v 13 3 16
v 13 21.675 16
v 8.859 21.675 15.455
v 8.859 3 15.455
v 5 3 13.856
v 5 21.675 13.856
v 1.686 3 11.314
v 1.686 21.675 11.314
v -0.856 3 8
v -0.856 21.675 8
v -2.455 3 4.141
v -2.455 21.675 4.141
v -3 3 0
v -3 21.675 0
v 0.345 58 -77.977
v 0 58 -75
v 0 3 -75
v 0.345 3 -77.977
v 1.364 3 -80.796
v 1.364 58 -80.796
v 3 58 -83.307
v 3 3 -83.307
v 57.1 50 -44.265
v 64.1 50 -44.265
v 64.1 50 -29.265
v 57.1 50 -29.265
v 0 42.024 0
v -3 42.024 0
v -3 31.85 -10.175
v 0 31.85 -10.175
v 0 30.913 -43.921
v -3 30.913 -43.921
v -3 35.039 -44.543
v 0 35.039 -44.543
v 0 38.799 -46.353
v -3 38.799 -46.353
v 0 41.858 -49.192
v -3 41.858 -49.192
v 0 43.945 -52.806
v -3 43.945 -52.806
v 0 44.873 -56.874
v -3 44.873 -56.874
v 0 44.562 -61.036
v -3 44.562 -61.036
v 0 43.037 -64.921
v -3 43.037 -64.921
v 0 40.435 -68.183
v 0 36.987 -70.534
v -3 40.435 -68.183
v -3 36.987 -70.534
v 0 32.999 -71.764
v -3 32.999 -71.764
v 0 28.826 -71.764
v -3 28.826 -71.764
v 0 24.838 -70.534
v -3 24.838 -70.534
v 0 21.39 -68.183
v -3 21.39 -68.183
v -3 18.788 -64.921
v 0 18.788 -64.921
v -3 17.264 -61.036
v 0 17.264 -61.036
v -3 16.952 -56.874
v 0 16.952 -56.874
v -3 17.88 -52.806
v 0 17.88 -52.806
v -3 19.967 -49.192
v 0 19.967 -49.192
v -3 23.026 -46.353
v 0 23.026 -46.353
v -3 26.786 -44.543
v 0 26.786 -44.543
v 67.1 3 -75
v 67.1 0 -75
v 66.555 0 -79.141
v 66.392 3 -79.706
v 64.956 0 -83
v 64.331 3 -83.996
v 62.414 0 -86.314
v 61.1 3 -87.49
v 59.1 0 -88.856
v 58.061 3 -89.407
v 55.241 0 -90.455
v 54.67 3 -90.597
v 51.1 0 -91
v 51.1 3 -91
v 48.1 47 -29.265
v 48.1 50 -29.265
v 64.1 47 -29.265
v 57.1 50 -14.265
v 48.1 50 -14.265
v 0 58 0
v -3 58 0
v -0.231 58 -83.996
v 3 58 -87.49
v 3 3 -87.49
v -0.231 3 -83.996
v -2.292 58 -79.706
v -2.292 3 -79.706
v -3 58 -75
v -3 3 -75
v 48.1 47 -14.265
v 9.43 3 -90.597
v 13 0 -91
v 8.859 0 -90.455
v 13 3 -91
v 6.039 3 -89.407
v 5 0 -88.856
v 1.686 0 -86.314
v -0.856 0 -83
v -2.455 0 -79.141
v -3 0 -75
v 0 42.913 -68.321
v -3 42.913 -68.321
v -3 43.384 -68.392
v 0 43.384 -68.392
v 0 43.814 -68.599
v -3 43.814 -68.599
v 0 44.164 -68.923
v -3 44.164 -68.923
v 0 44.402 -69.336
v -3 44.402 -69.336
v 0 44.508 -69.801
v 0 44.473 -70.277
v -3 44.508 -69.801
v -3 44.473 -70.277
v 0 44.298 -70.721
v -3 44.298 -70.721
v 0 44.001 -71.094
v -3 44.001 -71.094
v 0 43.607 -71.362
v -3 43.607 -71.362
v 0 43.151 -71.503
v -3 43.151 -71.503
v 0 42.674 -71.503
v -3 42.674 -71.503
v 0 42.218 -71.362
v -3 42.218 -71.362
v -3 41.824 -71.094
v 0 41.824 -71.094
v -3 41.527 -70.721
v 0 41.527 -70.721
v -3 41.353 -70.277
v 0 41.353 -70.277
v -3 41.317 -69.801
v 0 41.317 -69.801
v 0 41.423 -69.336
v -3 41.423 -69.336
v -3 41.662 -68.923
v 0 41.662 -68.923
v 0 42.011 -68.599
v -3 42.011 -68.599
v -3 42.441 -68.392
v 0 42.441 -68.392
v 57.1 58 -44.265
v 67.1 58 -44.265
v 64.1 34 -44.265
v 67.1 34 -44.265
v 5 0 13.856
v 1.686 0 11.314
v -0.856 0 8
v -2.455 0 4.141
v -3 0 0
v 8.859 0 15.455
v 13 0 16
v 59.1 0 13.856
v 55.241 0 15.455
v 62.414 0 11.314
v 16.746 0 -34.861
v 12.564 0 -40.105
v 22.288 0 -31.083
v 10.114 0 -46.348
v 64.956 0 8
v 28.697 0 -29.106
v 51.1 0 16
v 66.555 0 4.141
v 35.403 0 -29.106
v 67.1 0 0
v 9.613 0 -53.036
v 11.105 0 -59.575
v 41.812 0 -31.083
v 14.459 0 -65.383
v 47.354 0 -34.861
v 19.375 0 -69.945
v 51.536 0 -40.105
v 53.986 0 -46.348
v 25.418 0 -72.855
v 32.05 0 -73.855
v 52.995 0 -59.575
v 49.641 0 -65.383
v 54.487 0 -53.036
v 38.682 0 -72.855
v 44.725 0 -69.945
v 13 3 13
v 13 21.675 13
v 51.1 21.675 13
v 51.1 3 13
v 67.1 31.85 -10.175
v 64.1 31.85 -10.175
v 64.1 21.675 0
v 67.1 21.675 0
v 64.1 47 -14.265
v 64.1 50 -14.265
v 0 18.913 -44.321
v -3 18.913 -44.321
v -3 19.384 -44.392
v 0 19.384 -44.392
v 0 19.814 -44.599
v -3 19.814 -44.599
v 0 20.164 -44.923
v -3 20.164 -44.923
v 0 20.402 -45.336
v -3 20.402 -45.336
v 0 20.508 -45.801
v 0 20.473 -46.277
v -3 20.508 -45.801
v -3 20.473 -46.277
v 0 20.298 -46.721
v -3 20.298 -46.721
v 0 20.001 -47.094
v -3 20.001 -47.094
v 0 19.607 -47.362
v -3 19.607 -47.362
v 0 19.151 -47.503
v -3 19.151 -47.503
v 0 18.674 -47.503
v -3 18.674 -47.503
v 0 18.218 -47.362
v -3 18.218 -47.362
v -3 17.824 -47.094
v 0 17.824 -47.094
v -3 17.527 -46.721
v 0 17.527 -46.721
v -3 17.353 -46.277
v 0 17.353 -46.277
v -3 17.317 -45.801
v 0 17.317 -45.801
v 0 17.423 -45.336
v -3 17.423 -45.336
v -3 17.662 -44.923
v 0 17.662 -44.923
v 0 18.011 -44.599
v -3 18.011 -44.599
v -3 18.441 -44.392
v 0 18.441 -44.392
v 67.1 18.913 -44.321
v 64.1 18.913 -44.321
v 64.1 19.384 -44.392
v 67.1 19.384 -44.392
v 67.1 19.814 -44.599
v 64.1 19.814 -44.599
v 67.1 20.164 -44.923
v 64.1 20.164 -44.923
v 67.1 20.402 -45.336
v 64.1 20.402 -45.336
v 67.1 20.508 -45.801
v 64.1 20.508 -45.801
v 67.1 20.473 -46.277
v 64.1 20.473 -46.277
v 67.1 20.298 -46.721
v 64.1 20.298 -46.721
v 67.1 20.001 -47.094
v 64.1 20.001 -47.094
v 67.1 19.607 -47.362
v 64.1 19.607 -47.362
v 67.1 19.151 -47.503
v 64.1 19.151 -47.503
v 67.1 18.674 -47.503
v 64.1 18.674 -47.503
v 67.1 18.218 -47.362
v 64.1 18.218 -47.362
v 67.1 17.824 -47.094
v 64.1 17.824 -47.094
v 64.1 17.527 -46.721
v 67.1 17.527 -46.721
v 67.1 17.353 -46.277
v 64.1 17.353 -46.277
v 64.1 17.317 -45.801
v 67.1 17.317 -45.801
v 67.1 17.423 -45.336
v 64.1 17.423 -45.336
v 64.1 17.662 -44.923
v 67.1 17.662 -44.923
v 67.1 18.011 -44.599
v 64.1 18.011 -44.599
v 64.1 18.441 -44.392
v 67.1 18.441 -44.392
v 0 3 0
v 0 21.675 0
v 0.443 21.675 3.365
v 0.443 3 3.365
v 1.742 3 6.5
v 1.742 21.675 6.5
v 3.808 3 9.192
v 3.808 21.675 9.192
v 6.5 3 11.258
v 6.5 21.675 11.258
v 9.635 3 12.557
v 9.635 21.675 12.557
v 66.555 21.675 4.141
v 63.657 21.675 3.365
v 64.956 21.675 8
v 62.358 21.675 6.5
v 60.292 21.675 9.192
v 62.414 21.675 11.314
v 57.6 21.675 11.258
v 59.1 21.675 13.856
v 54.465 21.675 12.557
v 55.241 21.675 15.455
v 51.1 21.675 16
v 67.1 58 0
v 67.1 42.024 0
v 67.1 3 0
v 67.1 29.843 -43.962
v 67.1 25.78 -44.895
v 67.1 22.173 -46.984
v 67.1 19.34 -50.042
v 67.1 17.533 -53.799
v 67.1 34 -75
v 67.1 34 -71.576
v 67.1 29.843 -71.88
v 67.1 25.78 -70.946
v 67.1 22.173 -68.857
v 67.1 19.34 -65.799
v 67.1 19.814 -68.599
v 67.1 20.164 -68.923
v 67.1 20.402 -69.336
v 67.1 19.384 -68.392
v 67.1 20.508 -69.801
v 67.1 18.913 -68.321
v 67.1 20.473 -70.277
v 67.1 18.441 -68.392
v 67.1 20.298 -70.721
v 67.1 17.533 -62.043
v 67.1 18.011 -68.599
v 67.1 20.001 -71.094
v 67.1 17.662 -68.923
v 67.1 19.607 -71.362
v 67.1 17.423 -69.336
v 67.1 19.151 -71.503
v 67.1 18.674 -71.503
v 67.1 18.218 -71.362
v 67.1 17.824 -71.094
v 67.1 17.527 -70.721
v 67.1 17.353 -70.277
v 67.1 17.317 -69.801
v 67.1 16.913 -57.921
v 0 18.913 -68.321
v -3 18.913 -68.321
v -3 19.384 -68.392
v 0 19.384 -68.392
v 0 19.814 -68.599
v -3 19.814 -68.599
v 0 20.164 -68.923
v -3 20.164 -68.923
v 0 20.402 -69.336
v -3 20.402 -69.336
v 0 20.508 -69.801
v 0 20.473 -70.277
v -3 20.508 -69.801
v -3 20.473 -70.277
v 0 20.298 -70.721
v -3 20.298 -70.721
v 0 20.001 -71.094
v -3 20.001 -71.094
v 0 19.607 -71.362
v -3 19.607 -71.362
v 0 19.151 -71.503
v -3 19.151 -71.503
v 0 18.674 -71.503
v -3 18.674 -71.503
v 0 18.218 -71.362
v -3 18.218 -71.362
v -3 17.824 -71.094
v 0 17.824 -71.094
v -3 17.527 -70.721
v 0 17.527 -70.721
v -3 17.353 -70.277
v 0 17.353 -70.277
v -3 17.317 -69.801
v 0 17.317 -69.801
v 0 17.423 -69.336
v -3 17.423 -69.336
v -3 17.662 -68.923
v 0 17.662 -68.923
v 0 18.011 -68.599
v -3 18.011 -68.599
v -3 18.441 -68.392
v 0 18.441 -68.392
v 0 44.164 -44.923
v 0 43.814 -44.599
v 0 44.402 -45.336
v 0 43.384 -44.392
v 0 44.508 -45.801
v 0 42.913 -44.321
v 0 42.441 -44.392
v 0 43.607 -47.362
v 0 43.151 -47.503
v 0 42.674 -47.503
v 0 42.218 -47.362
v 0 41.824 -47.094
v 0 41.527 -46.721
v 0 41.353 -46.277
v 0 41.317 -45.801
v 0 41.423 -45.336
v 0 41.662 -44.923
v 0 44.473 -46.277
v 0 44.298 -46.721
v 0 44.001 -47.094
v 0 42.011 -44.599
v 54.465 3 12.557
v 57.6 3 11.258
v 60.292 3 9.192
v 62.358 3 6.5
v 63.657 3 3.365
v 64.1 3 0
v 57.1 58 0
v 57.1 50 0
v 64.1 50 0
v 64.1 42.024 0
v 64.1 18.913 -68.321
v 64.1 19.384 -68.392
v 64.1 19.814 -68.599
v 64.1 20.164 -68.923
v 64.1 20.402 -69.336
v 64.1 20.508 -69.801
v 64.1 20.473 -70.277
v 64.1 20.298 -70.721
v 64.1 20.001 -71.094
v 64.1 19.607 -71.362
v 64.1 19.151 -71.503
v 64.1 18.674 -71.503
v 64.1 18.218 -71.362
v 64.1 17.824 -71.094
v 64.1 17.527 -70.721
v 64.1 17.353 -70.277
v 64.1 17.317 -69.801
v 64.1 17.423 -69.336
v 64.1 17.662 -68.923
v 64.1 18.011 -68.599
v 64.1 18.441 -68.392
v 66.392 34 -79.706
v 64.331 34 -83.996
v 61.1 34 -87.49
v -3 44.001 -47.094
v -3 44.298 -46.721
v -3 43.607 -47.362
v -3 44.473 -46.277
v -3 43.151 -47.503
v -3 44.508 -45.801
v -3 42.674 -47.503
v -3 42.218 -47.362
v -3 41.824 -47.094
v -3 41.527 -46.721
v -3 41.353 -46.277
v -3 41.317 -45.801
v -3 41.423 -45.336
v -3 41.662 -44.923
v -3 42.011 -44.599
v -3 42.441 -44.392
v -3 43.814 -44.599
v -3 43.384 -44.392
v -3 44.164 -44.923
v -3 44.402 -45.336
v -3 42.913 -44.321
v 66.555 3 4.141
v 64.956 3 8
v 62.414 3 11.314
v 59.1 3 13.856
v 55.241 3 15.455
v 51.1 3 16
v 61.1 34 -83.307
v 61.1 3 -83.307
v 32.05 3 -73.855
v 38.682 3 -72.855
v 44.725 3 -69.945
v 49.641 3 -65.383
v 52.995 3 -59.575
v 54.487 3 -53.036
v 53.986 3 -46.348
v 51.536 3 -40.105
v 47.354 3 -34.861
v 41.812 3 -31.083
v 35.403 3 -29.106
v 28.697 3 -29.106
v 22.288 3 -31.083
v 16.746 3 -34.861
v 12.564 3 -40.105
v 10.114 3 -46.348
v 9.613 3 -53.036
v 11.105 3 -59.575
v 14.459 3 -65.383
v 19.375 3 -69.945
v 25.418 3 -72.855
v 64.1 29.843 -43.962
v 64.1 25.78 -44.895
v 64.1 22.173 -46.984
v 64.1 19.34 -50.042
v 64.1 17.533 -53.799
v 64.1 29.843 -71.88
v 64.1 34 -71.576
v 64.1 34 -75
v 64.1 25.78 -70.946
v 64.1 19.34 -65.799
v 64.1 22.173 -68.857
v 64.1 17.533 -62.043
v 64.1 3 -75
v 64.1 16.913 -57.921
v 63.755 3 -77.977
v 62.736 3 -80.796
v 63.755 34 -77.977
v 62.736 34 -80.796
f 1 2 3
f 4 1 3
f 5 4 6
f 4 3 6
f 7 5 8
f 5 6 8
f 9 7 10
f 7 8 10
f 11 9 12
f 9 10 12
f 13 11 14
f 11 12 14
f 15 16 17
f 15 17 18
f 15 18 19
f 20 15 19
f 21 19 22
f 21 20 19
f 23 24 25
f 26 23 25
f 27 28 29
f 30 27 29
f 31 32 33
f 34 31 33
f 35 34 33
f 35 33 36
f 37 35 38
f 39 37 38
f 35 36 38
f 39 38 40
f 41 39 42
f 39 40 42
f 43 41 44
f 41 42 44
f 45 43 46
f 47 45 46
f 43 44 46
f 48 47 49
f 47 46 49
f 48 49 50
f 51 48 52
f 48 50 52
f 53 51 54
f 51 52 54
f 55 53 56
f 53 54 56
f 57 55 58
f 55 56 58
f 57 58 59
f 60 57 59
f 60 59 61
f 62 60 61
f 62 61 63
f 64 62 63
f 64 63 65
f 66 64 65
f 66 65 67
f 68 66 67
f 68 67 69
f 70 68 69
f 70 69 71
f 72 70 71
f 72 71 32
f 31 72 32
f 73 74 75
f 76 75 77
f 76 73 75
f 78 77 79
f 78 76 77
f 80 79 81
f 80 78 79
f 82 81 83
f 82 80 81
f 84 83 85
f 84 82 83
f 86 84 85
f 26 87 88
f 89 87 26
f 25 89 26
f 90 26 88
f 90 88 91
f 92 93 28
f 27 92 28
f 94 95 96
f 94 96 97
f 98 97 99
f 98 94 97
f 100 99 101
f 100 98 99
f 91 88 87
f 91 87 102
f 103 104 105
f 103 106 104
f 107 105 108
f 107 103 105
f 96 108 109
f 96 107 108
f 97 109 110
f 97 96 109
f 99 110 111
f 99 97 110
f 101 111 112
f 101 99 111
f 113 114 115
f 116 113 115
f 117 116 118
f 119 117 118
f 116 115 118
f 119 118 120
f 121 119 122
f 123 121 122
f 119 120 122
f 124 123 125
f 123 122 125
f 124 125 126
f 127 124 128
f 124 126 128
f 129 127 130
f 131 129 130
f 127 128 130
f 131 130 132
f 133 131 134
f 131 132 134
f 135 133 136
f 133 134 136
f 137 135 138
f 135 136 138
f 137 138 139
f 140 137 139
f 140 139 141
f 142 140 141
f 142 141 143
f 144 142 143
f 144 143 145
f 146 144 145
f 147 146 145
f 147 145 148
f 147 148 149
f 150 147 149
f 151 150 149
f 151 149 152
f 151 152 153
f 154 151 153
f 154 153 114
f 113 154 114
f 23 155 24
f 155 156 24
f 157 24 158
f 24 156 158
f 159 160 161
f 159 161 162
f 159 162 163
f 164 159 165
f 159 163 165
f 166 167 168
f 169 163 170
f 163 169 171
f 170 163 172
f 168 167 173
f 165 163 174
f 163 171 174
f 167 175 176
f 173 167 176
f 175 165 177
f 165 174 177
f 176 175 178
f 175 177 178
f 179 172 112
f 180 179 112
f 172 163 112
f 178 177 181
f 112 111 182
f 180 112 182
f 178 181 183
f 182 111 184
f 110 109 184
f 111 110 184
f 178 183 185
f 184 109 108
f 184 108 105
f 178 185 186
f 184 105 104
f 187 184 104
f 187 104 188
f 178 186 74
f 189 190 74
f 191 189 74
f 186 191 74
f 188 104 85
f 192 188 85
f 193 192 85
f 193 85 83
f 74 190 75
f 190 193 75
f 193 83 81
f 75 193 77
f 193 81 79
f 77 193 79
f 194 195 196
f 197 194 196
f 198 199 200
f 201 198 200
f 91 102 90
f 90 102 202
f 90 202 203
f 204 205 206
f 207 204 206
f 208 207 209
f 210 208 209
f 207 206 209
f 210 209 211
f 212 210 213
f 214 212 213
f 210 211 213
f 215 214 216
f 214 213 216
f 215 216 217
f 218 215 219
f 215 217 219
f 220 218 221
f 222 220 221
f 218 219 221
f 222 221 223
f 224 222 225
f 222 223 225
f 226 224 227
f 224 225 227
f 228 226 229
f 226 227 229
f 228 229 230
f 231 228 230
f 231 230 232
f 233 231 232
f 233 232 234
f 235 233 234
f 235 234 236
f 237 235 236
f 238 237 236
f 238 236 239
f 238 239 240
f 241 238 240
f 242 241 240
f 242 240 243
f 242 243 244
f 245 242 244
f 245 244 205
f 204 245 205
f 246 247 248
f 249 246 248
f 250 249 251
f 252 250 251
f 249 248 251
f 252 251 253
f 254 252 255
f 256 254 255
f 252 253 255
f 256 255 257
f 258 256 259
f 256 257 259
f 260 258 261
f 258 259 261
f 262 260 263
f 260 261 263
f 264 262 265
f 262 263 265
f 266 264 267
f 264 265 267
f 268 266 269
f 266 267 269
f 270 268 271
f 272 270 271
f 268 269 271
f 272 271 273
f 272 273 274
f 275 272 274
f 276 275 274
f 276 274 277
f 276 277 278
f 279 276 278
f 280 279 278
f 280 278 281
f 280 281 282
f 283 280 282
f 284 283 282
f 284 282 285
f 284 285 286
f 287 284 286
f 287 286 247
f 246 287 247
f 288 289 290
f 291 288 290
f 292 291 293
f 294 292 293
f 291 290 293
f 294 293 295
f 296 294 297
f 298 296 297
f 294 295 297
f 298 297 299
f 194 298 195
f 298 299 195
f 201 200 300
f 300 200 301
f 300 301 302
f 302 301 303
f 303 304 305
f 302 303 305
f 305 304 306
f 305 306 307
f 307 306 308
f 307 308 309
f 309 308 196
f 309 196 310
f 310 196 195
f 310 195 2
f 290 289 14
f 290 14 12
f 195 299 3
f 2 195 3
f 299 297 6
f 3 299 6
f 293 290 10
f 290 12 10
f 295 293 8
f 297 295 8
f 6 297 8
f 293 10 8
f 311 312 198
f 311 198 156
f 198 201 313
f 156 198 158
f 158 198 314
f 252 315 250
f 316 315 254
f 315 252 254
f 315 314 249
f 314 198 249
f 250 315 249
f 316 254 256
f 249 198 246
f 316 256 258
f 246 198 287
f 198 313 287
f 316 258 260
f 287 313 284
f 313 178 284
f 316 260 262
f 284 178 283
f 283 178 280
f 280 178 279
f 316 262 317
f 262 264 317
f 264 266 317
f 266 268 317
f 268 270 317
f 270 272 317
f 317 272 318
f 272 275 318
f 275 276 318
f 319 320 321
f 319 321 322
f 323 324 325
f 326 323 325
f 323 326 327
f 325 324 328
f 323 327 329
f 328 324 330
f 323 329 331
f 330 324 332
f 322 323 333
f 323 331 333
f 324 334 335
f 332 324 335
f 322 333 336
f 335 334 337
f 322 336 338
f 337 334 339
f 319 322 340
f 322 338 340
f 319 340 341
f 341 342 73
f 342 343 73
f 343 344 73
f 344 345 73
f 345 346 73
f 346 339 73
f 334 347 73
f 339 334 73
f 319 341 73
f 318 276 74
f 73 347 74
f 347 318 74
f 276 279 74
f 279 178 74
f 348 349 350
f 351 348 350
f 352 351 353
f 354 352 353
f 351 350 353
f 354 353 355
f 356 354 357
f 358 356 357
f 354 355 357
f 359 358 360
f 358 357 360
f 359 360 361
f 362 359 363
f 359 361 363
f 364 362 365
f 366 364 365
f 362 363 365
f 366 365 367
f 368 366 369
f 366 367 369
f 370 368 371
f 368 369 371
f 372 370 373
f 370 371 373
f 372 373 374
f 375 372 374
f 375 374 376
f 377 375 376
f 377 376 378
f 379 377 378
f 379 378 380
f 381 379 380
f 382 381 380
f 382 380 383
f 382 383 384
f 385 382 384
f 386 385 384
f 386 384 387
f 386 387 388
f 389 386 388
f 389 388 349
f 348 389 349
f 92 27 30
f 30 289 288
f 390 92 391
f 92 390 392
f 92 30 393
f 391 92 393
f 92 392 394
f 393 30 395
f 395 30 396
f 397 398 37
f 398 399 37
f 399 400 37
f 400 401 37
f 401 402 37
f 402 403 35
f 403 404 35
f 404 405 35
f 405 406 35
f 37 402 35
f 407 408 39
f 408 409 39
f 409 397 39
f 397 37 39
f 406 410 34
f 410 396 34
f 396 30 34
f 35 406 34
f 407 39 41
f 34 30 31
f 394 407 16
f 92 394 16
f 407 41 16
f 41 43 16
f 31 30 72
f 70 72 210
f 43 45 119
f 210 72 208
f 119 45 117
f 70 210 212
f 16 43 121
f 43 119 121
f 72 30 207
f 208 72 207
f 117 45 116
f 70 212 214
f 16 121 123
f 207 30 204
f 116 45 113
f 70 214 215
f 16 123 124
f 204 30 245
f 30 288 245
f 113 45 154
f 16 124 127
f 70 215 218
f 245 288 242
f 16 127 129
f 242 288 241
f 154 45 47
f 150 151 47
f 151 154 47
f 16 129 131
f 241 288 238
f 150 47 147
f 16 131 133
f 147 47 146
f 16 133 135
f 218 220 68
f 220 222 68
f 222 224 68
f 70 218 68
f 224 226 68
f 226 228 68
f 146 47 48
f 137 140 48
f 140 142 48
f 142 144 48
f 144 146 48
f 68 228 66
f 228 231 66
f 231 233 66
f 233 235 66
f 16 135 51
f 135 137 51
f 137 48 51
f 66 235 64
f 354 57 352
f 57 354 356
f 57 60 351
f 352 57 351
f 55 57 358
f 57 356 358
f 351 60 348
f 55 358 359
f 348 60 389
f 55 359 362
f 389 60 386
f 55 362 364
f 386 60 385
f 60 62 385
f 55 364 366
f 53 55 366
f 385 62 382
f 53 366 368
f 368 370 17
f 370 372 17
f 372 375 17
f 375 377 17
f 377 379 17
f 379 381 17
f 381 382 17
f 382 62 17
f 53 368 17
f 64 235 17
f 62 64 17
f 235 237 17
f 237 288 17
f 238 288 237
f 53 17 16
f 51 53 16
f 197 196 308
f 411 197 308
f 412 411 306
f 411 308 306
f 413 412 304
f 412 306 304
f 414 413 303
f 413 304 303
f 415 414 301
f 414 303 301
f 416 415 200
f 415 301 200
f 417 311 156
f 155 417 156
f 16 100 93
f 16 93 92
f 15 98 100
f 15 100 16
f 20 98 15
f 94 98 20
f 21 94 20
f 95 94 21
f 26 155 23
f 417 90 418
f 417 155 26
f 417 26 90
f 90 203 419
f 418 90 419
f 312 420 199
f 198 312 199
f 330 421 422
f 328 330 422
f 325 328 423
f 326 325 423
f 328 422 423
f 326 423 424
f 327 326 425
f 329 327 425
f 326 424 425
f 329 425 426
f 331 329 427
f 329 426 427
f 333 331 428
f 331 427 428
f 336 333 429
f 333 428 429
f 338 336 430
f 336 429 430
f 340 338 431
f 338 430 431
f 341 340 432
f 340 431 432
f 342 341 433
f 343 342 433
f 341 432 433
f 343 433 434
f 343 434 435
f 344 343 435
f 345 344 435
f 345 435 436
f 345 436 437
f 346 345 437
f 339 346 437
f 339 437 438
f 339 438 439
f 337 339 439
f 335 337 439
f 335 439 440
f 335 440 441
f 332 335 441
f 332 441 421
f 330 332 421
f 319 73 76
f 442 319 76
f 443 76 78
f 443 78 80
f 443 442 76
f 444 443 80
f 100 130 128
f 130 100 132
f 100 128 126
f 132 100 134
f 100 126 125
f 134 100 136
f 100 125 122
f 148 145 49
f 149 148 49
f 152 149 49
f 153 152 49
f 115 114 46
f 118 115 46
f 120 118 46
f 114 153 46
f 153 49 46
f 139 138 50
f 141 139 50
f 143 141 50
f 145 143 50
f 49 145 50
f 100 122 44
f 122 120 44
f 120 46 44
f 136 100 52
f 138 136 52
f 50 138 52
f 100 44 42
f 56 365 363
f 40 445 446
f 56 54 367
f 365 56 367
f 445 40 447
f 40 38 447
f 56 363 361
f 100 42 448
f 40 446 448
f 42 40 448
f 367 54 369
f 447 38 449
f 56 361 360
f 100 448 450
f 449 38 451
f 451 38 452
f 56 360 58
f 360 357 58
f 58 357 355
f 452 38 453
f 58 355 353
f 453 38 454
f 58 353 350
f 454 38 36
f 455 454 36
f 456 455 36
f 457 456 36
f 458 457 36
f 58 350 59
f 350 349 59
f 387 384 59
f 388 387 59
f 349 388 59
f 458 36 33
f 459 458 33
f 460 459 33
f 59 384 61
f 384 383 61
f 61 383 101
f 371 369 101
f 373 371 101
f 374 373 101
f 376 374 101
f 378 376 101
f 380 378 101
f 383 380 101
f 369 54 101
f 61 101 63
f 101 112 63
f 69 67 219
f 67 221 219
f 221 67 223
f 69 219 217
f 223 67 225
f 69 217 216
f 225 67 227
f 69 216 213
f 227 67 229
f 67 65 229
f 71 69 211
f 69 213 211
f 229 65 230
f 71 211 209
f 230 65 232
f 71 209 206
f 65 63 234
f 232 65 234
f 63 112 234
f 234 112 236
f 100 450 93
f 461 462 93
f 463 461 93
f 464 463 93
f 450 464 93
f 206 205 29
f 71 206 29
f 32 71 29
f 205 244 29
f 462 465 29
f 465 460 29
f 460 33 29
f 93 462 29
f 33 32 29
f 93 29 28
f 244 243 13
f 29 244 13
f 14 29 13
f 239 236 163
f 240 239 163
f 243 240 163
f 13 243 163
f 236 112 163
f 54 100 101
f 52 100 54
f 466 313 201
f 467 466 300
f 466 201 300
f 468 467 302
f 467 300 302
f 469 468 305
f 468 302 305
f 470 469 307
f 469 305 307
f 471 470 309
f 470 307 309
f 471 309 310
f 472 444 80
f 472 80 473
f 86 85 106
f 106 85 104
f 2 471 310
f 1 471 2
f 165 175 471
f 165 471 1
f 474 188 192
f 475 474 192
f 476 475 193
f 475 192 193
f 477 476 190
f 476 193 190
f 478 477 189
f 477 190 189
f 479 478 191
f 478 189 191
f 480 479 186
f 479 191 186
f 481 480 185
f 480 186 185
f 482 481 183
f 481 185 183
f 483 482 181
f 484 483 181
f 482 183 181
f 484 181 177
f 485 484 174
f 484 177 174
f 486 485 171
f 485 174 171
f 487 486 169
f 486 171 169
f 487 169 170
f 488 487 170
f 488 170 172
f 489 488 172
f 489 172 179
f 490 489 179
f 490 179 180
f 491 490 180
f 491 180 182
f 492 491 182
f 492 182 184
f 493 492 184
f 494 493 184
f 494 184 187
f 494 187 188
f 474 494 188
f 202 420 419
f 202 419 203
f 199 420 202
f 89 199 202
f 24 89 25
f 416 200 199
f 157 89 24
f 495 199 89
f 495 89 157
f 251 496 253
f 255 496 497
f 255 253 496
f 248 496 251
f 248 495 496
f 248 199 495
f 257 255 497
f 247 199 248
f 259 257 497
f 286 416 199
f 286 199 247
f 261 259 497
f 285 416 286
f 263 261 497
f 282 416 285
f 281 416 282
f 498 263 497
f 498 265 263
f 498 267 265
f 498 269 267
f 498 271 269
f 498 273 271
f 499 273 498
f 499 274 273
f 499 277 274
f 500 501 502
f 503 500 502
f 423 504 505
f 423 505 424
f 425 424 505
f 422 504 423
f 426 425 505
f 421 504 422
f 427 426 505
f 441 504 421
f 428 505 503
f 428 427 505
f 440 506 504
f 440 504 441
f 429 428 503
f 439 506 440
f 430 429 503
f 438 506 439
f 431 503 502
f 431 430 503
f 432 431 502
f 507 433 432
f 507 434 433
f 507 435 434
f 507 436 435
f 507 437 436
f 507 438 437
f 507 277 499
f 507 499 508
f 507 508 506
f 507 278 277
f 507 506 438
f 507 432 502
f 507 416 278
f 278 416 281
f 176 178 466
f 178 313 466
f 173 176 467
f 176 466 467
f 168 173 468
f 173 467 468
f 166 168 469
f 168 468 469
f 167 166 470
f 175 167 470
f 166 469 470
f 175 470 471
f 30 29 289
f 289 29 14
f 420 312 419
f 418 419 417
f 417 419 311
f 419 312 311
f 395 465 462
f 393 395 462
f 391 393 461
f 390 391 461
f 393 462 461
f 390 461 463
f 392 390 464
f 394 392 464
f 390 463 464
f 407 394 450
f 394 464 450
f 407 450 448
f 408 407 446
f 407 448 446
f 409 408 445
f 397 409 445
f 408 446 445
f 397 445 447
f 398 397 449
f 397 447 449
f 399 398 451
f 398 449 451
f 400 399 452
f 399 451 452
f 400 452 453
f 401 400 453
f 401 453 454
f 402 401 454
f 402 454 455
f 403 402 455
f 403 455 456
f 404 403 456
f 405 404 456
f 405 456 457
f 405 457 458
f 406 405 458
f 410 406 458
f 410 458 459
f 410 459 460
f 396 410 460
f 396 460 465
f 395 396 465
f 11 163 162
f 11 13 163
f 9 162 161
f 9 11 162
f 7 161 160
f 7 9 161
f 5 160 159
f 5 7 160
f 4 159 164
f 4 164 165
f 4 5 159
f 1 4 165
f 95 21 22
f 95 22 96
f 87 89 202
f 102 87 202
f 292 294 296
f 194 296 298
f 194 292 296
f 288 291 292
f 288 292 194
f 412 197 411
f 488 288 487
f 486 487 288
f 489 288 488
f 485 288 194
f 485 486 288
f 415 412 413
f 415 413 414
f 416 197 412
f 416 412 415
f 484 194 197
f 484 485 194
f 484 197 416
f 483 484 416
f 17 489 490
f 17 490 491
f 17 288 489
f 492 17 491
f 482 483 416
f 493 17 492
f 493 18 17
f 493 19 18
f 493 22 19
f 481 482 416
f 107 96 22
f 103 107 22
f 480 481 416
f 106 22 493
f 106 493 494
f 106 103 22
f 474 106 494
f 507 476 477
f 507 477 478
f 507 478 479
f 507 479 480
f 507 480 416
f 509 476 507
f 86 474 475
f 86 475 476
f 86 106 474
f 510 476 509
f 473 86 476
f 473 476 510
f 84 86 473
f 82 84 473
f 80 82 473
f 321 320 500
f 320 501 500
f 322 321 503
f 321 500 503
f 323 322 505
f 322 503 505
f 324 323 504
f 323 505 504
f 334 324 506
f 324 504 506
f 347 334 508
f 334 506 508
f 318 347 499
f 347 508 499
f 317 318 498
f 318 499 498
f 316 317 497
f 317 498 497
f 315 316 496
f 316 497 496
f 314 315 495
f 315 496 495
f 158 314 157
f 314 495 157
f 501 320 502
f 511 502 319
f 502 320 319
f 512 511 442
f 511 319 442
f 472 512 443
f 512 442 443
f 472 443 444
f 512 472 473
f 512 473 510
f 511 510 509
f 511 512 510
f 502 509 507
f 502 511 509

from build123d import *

# Parameters (mm, degrees)
SKETCH1_W           = 64.1
SKETCH1_H           = 75
BOSS_EXTRUDE1_DEPTH = 3
SKETCH1_4_W         = 3
SKETCH1_4_H         = 75
BOSS_EXTRUDE2_DEPTH = 58
SKETCH2_R           = 22.5
CUT_EXTRUDE1_DEPTH  = 10
FILLET2_R           = 16
BOSS_EXTRUDE3_START = 55
BOSS_EXTRUDE3_DEPTH = 55
SKETCH5_R           = 14
SKETCH5_R_2         = 1.6
CUT_EXTRUDE2_DEPTH  = 129.681816897
SKETCH7_W           = 43.224612372
SKETCH7_H           = 24
CUT_EXTRUDE3_DEPTH  = 10
SKETCH5_5_W         = 23.859751581
SKETCH5_5_H         = 20.349819761
CUT_EXTRUDE5_DEPTH  = 74
BOSS_EXTRUDE4_DEPTH = 7
SKETCH9_4_W         = 15
SKETCH9_4_H         = 3
BOSS_EXTRUDE5_DEPTH = 16


with BuildPart() as part:
    # Sketch1 → Boss-Extrude1 (new body)
    with BuildSketch(Plane(origin=(0, 0, 0), x_dir=(1, 0, 0), z_dir=(0, 1, 0))):
        Polygon((64.1, 75), (67.1, 75), (67.1, 91), (-3, 91), (-3, 75), (0, 75), align=None)
        with Locations((32.05, 37.5)):
            Rectangle(SKETCH1_W, SKETCH1_H)
        Polygon((67.1, 0), (67.1, -16), (-3, -16), (-3, 0), (0, 0), (64.1, 0), align=None)
    extrude(amount=BOSS_EXTRUDE1_DEPTH)

    # Sketch1<4> → Boss-Extrude2 (add)
    with BuildSketch(Plane(origin=(0, 0, 0), x_dir=(1, 0, 0), z_dir=(0, 1, 0))):
        with Locations((65.6, 37.5)):
            Rectangle(SKETCH1_4_W, SKETCH1_4_H)
        with Locations((-1.5, 37.5)):
            Rectangle(SKETCH1_4_W, SKETCH1_4_H)
    extrude(amount=BOSS_EXTRUDE2_DEPTH)

    # Sketch2 → Cut-Extrude1 (cut)
    with BuildSketch(Plane.XZ):
        with Locations(Location((32.05, -51.354505882, 0), (0, 0, 270))):
            Circle(SKETCH2_R)
    extrude(amount=-CUT_EXTRUDE1_DEPTH, mode=Mode.SUBTRACT)

    # Fillet2
    fillet2_edges = [part.edges().sort_by_distance(p)[0] for p in [
        (-3, 1.5, -91),
        (67.1, 1.5, -91),
        (67.1, 1.5, 16),
        (-3, 1.5, 16),
    ]]
    fillet(fillet2_edges, radius=FILLET2_R)

    # Sketch6 → Boss-Extrude3 (add)
    with BuildSketch(Plane(origin=(0, 3, 0), x_dir=(1, 0, 0), z_dir=(0, 1, 0)).offset(BOSS_EXTRUDE3_START)):
        with BuildLine():
            Line((3, 83.306623863), (3, 87.489995997))
            ThreePointArc((3, 87.489995997), (-1.422205102, 81.92820323), (-3, 75))
            Line((-3, 75), (0, 75))
            ThreePointArc((0, 75), (0.772980739, 79.415880433), (3, 83.306623863))
        make_face()
        with BuildLine():
            Line((61.1, 87.489995997), (61.1, 83.306623863))
            ThreePointArc((61.1, 83.306623863), (63.327019261, 79.415880433), (64.1, 75))
            Line((64.1, 75), (67.1, 75))
            ThreePointArc((67.1, 75), (65.522205102, 81.92820323), (61.1, 87.489995997))
        make_face()
        with BuildLine():
            Line((64.1, 0), (67.1, 0))
            ThreePointArc((67.1, 0), (62.413708499, -11.313708499), (51.1, -16))
            Line((51.1, -16), (13, -16))
            ThreePointArc((13, -16), (1.686291501, -11.313708499), (-3, 0))
            Line((-3, 0), (0, 0))
            ThreePointArc((0, 0), (3.807611845, -9.192388155), (13, -13))
            Line((13, -13), (51.1, -13))
            ThreePointArc((51.1, -13), (60.292388155, -9.192388155), (64.1, 0))
        make_face()
    extrude(amount=-BOSS_EXTRUDE3_DEPTH)

    # Sketch5 → Cut-Extrude2 (cut, through all)
    with BuildSketch(Plane.ZY.offset(3)):
        with Locations((-57.920720454, 30.91264254)):
            Circle(SKETCH5_R)
        with Locations((-69.920720454, 42.91264254)):
            Circle(SKETCH5_R_2)
        with Locations((-69.920720454, 18.91264254)):
            Circle(SKETCH5_R_2)
        with Locations((-45.920720454, 18.91264254)):
            Circle(SKETCH5_R_2)
        with Locations((-45.920720454, 42.91264254)):
            Circle(SKETCH5_R_2)
    extrude(amount=-CUT_EXTRUDE2_DEPTH, mode=Mode.SUBTRACT)

    # Sketch7 → Cut-Extrude3 (cut)
    with BuildSketch(Plane(origin=(67.1, 0, 0), x_dir=(0, 0, -1), z_dir=(1, 0, 0))):
        with Locations((65.877689811, 46)):
            Rectangle(SKETCH7_W, SKETCH7_H)
    extrude(amount=-CUT_EXTRUDE3_DEPTH, mode=Mode.SUBTRACT)

    # Sketch5<5> → Cut-Extrude5 (cut)
    with BuildSketch(Plane.ZY.offset(3)):
        Polygon((0, 58), (0, 42.024482082), (23.859751581, 42.024482082), (23.859751581, 64.276966148), (0, 64.276966148), align=None)
        with Locations((11.929875791, 31.849572202)):
            Rectangle(SKETCH5_5_W, SKETCH5_5_H)
        Polygon((0, 21.674662321), (0, 42.024482082), (-10.174909881, 31.849572202), align=None)
    extrude(amount=-CUT_EXTRUDE5_DEPTH, mode=Mode.SUBTRACT)

    # Sketch9 → Boss-Extrude4 (add)
    with BuildSketch(Plane.ZY.offset(-64.1)):
        Polygon((0, 58), (-44.265383625, 58), (-44.265383625, 50), (-29.265383625, 50), (-14.265383625, 50), (0, 50), align=None)
    extrude(amount=BOSS_EXTRUDE4_DEPTH)

    # Sketch9<4> → Boss-Extrude5 (add)
    with BuildSketch(Plane.ZY.offset(-64.1)):
        with Locations((-21.765383625, 48.5)):
            Rectangle(SKETCH9_4_W, SKETCH9_4_H)
    extrude(amount=BOSS_EXTRUDE5_DEPTH)


solid = part.part
